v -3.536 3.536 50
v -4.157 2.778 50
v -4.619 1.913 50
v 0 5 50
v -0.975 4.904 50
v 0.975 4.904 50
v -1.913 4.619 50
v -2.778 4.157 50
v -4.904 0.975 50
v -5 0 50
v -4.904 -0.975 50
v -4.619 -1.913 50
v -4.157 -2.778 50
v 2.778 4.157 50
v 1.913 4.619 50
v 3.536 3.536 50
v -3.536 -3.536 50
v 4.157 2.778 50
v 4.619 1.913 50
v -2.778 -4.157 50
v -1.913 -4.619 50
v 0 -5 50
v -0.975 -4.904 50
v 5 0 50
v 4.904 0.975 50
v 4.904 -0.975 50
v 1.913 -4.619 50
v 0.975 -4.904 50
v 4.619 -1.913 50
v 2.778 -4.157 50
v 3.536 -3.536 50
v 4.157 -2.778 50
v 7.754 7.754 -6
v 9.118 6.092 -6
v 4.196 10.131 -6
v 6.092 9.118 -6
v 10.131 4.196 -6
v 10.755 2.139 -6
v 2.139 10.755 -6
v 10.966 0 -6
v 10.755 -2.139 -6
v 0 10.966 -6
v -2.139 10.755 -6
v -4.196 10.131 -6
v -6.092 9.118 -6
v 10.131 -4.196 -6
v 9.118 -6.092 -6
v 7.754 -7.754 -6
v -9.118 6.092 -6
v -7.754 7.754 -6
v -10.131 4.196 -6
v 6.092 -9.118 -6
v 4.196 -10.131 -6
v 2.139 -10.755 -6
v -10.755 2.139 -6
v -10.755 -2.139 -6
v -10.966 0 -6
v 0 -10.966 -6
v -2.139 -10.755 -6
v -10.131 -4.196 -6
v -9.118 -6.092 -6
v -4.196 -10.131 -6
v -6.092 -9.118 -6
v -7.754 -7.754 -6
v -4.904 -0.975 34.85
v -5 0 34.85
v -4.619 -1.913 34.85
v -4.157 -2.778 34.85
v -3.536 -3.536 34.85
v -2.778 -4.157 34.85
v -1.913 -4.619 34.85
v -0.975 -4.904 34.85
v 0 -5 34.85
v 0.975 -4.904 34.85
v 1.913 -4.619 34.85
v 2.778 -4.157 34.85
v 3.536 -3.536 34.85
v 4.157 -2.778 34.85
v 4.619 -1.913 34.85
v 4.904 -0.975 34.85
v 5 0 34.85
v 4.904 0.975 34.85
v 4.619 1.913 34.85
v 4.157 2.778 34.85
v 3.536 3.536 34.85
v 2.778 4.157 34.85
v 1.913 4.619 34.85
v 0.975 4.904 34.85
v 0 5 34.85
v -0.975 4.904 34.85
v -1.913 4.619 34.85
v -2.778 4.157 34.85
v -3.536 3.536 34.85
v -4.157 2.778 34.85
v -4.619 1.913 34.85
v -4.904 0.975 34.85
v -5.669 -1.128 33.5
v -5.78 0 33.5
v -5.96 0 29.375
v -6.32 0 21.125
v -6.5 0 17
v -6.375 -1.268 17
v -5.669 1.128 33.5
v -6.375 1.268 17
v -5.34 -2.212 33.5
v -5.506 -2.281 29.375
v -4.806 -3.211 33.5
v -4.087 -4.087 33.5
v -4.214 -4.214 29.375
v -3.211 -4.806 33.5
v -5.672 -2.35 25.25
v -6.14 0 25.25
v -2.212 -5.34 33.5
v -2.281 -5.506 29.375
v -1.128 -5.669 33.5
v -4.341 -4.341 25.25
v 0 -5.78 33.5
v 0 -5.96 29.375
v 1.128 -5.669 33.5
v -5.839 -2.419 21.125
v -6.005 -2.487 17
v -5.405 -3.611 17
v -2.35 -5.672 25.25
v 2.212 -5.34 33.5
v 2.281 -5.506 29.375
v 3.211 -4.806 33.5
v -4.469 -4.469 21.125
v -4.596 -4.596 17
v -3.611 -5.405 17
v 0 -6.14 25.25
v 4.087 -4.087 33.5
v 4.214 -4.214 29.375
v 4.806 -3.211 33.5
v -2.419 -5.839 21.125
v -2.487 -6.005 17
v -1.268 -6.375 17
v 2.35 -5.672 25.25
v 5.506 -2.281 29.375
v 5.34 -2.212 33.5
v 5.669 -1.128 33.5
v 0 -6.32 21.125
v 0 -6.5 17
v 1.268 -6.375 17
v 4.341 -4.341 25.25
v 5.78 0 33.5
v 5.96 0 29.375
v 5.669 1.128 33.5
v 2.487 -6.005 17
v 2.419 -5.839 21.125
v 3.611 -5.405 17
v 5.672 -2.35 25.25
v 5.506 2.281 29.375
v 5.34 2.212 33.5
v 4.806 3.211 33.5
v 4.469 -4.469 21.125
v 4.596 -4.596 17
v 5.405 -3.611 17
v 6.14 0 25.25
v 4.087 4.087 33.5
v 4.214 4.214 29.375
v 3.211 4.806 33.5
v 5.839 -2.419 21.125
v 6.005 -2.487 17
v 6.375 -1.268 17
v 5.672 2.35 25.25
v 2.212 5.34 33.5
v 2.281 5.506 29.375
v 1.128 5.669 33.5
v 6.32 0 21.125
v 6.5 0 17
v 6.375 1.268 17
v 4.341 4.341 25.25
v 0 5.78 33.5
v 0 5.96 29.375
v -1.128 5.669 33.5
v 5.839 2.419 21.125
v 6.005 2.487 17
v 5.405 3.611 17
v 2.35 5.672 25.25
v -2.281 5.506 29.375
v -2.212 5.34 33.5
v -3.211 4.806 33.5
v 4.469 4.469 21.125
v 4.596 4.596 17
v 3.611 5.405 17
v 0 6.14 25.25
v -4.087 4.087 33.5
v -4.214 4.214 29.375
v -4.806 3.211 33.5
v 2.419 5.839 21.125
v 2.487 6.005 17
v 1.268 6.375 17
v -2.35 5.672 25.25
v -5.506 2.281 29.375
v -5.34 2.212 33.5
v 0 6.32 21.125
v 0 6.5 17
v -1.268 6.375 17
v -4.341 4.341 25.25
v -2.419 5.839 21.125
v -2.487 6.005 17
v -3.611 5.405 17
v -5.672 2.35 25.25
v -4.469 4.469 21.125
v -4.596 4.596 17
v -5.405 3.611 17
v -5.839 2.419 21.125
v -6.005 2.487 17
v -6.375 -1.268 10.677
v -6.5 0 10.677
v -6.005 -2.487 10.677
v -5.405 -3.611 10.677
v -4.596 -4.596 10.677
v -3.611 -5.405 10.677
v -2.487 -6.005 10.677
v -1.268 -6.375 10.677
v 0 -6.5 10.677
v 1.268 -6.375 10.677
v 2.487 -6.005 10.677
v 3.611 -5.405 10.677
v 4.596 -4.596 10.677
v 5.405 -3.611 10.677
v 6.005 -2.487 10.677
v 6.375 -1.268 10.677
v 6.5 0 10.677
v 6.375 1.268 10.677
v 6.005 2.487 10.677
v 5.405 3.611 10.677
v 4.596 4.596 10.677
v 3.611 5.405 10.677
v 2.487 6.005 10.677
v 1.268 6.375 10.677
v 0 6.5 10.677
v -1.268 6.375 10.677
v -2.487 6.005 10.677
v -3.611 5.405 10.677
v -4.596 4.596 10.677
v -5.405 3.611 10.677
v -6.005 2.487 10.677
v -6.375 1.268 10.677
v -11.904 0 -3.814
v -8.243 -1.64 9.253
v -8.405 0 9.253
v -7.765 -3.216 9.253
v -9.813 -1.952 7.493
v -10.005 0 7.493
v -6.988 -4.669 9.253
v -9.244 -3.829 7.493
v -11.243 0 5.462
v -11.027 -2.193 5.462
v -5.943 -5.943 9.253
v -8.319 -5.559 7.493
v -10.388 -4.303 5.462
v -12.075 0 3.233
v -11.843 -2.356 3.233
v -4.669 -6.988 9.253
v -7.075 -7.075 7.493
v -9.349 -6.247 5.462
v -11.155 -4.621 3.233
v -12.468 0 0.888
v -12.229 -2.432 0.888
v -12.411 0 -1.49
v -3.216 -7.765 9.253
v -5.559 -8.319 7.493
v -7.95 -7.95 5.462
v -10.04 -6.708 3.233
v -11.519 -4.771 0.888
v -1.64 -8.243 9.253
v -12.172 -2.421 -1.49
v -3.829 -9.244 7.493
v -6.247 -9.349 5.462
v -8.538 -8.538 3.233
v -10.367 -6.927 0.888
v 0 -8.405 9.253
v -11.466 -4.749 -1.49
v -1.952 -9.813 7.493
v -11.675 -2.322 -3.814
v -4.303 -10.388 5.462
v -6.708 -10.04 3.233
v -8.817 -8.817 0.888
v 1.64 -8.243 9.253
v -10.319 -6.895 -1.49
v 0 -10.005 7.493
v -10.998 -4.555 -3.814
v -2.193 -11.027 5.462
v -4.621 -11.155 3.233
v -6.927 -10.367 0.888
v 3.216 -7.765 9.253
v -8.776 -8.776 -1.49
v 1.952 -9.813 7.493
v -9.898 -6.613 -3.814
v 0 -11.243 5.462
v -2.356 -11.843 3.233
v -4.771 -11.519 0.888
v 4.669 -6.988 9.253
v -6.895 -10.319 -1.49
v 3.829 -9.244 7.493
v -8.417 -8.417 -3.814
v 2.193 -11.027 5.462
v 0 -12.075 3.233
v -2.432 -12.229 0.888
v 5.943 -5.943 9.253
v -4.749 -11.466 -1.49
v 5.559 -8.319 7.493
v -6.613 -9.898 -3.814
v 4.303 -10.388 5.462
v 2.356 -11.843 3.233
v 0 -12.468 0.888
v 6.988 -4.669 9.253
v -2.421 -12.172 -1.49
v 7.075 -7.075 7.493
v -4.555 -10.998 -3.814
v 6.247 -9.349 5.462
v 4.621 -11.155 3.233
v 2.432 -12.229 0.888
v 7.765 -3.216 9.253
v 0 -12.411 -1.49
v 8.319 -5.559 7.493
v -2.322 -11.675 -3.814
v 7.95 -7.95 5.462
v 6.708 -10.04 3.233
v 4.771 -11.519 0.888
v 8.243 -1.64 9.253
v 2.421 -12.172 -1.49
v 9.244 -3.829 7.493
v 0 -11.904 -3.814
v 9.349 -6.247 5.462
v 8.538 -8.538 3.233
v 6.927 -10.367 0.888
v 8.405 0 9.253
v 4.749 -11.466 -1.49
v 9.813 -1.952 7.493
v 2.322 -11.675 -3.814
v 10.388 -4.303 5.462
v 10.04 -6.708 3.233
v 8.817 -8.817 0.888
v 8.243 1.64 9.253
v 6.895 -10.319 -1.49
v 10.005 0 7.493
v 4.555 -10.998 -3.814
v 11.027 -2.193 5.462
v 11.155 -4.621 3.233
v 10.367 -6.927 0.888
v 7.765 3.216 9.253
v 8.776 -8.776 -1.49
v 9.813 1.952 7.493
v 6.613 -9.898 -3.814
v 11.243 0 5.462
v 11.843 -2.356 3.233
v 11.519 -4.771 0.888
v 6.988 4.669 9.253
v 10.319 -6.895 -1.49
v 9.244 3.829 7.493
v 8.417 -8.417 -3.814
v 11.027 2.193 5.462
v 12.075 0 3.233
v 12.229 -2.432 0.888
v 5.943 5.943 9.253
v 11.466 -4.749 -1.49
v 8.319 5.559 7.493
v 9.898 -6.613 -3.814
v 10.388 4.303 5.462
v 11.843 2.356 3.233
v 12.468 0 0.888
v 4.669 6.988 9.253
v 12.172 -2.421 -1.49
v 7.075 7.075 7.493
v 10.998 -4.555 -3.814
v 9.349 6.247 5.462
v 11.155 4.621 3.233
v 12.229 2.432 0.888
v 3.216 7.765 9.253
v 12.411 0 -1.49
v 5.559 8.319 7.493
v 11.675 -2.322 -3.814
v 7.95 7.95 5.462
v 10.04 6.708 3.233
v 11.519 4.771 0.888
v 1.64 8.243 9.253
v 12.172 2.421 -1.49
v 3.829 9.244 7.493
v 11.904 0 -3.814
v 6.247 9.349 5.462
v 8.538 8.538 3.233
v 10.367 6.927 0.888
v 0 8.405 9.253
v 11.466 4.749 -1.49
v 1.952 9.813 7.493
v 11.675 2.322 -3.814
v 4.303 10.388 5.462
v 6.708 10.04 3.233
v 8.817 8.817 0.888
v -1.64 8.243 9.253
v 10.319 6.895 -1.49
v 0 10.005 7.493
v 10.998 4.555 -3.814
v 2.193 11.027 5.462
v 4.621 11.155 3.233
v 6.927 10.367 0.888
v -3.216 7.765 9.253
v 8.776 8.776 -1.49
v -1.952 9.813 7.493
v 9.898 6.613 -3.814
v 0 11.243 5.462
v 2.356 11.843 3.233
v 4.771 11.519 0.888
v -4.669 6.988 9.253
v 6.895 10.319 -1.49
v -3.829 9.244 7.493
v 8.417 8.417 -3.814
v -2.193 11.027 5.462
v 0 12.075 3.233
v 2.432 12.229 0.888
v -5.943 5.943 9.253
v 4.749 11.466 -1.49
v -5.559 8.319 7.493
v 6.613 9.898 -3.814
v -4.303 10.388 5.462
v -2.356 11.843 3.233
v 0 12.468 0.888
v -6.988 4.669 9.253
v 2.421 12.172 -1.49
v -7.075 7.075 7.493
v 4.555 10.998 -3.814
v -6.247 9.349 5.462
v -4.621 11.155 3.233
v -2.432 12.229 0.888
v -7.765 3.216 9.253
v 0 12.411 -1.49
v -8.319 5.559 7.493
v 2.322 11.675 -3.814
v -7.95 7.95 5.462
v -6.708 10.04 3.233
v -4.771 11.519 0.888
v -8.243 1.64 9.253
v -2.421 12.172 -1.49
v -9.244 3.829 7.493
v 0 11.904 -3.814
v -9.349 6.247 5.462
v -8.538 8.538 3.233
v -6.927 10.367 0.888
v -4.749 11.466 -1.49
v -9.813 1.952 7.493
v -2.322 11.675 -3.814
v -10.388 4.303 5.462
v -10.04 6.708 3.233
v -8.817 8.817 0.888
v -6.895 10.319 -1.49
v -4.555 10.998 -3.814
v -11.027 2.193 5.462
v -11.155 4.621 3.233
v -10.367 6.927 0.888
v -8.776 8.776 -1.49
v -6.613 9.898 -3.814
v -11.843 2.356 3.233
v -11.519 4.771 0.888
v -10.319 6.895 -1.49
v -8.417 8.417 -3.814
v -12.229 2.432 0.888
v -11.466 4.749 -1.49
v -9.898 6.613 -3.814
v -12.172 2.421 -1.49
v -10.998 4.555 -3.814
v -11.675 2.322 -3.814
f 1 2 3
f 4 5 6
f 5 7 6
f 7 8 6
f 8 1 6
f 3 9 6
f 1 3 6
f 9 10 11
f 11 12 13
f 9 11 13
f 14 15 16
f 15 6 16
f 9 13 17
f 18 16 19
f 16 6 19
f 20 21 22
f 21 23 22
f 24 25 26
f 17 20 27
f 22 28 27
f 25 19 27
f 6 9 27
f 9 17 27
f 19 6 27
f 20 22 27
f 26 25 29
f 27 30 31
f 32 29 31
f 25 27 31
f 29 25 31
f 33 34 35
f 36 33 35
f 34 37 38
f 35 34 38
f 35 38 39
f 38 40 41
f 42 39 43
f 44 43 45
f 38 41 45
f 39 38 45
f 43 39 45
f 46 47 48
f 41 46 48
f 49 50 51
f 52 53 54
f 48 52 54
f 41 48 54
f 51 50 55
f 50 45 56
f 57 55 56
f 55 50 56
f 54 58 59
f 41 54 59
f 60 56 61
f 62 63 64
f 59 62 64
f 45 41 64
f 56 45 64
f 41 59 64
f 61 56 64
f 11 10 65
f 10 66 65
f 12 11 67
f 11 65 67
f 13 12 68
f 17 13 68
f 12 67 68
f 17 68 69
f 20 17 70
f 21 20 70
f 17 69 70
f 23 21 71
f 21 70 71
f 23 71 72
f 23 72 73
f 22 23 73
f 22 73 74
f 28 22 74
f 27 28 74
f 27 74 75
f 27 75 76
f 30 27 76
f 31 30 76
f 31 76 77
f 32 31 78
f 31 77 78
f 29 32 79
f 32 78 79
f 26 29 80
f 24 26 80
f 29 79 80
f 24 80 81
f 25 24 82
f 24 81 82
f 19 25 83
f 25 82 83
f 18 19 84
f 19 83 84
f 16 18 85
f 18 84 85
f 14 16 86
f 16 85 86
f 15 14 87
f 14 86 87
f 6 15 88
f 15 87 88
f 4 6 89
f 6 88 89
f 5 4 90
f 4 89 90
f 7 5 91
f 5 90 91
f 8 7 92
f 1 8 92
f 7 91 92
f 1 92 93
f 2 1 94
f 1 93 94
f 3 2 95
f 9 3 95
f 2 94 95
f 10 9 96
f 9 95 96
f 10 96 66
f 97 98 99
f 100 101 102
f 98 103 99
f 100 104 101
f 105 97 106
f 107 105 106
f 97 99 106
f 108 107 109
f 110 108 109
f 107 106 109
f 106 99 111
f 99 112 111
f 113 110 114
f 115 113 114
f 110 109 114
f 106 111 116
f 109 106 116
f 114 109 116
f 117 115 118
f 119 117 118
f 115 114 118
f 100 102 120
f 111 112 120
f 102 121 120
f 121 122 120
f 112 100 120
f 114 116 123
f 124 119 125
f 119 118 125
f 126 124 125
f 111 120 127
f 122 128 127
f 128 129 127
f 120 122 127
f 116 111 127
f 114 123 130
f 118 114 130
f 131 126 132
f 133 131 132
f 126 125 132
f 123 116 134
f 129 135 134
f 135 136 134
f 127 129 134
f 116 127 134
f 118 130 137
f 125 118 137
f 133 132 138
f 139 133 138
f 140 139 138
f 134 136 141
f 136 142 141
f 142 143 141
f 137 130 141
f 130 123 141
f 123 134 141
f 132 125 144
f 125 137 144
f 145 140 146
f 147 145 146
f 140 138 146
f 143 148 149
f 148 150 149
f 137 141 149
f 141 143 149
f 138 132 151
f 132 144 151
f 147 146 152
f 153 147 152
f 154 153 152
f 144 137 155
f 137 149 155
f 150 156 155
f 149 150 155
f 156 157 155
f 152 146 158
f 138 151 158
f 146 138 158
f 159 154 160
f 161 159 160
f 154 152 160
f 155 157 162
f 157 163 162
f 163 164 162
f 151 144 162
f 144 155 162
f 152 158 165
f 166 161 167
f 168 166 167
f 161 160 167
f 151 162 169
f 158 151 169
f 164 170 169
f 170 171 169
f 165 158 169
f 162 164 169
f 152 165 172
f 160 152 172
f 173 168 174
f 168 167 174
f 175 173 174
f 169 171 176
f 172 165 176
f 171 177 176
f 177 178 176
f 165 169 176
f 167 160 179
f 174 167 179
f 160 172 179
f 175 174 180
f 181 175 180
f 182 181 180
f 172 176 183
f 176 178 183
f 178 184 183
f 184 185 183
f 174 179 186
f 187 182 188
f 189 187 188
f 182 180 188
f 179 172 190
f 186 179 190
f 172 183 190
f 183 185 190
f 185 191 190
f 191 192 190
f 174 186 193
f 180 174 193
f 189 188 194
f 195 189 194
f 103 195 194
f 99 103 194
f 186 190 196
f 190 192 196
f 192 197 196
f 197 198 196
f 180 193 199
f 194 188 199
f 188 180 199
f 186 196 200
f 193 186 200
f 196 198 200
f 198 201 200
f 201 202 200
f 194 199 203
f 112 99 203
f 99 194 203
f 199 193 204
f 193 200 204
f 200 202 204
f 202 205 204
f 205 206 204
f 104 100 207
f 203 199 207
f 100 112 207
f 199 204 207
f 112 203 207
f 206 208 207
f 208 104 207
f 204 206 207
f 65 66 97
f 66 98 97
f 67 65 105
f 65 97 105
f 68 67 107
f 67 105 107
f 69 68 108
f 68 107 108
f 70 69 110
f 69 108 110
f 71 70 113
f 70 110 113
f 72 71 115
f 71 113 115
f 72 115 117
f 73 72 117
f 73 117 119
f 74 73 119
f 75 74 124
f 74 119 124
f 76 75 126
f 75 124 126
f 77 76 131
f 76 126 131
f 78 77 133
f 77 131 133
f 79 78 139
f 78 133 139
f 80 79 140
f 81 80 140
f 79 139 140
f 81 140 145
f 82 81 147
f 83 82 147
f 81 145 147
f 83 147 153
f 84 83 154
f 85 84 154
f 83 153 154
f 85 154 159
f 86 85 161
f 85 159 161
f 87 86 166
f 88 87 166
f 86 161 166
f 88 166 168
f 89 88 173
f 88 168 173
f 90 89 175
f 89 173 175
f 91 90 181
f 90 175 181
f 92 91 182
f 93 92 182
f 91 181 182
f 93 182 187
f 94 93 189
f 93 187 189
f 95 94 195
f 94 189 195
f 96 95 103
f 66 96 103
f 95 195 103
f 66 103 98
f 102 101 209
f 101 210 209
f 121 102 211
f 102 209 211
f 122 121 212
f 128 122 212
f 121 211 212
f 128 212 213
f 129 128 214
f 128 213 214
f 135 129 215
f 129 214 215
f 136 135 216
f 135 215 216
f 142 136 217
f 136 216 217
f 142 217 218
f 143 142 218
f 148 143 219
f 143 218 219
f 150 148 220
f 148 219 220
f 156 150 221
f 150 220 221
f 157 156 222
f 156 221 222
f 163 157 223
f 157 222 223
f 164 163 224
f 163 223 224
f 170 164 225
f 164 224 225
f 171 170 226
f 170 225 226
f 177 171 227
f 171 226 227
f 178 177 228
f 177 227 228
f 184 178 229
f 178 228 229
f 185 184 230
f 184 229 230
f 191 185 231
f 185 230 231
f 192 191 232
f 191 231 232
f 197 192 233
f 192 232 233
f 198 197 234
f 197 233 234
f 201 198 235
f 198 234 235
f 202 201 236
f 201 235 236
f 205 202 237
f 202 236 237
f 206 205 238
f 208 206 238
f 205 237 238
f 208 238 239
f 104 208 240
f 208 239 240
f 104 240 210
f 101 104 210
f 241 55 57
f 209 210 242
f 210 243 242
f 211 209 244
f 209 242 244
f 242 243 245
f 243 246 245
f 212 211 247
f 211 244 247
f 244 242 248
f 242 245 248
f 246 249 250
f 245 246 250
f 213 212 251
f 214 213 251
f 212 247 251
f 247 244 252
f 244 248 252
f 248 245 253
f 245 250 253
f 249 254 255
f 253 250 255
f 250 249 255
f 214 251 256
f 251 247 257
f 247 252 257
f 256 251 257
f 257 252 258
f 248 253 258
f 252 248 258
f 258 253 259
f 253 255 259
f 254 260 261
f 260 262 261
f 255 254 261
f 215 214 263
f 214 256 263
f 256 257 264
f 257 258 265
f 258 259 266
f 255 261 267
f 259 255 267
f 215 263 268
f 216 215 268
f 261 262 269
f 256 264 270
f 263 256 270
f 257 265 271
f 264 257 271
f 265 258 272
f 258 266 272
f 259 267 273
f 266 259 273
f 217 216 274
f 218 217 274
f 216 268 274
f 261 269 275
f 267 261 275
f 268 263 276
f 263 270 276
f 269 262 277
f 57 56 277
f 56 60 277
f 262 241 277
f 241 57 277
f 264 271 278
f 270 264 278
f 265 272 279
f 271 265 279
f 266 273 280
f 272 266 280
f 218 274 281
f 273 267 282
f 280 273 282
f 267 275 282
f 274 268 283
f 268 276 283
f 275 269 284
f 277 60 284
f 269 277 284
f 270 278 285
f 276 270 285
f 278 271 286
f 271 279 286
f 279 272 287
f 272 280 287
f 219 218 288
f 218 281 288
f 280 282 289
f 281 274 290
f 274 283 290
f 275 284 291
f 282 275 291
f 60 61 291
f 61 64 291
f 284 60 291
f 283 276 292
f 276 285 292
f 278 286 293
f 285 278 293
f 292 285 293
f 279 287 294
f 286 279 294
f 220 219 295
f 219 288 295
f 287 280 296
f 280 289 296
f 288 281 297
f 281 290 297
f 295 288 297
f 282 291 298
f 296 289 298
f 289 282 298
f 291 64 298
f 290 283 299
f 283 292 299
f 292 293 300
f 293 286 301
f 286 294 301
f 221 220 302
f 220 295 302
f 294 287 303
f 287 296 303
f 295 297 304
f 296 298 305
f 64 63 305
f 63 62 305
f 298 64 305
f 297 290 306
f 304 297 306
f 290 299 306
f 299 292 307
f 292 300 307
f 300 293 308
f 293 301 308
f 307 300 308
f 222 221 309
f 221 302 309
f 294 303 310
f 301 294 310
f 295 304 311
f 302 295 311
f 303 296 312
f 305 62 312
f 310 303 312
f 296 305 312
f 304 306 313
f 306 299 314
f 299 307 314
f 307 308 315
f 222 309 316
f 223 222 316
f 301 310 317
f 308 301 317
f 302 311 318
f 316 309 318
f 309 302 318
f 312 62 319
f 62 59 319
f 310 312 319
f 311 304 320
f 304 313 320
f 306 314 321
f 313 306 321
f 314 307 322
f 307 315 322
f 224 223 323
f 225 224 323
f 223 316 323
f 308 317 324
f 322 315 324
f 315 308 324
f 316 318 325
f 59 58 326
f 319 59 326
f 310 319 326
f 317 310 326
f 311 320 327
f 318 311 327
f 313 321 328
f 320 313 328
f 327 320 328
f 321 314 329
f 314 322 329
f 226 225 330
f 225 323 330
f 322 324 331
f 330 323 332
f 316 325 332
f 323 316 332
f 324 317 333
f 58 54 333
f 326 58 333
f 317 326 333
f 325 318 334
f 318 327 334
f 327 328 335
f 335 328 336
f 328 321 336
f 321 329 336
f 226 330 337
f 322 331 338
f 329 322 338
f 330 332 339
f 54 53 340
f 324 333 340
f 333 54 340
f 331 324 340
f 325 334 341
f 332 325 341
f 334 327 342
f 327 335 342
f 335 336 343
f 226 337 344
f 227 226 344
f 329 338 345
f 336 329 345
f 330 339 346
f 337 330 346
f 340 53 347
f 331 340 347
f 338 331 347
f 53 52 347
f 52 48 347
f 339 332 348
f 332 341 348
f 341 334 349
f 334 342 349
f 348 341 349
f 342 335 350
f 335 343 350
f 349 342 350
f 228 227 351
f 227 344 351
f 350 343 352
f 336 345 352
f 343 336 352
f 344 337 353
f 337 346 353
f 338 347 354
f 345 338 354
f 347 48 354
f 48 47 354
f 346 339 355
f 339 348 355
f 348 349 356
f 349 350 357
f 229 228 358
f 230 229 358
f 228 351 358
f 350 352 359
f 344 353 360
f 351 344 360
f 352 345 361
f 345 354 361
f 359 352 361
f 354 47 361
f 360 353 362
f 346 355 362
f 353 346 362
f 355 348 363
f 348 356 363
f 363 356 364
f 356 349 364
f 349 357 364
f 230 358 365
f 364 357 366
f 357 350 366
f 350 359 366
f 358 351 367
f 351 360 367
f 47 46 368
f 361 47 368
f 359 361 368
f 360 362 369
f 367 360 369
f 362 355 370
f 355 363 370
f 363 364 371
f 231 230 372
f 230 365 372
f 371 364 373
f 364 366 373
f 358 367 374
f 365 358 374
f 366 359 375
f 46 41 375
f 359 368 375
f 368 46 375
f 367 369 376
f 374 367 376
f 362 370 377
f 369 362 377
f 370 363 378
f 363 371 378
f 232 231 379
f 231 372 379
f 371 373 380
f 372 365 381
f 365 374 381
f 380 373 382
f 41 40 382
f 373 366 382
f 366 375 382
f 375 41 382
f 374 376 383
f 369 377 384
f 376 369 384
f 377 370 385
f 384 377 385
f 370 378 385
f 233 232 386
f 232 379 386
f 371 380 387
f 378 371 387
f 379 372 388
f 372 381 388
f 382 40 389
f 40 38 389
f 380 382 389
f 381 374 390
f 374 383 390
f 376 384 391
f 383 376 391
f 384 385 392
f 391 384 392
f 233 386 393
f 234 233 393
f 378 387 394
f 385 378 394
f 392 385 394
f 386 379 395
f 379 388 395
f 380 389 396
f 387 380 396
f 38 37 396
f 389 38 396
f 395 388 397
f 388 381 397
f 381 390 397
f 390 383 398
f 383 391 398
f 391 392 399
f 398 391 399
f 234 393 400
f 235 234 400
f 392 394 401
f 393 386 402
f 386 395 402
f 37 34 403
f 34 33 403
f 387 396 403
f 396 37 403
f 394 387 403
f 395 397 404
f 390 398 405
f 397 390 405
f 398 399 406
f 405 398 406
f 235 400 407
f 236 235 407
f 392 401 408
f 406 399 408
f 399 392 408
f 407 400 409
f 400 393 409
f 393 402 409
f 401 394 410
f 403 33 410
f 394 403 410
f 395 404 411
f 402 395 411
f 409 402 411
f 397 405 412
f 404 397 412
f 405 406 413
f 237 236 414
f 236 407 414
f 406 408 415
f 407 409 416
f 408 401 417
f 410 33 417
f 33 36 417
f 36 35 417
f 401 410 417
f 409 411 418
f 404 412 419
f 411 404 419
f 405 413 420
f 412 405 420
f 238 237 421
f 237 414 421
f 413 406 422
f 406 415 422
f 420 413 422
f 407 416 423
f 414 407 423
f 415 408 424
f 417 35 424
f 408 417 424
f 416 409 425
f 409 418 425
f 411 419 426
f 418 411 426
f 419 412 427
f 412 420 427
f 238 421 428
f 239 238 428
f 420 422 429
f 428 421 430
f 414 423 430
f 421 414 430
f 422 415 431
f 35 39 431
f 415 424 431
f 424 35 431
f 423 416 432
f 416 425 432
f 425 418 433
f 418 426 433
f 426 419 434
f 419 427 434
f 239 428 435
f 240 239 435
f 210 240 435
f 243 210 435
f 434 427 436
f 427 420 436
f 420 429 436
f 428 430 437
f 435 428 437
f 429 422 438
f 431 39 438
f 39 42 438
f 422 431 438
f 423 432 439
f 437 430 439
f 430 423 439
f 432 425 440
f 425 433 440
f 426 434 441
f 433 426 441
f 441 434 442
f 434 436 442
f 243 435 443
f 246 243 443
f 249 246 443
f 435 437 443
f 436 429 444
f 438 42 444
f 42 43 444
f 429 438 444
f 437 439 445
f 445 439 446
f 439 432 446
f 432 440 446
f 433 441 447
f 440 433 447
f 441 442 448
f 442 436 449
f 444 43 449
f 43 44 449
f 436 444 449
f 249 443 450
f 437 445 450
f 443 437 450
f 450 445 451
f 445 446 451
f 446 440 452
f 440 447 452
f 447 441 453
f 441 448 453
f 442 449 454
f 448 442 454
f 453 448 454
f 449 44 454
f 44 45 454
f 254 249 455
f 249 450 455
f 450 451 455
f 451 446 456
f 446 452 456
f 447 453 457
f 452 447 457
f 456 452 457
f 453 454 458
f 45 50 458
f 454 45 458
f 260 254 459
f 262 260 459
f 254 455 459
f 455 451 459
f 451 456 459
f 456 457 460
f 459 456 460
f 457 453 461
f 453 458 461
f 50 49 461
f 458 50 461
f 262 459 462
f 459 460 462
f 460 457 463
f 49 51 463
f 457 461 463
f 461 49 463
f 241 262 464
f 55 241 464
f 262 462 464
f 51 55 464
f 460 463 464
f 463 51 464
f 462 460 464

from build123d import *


with BuildPart() as f1:
    # F0 (on Front) → F1 (revolve)
    with BuildSketch(Plane.XZ):
        with BuildLine():
            Line((-6.5, 17), (-6.5, 10.677078))
            ThreePointArc((-6.5, 10.677078), (-12.074571, 3.233378), (-10.965856, -6))
            Line((-10.965856, -6), (0, -6))
            Line((0, -6), (0, 50))
            Line((0, 50), (-5, 50))
            Line((-5, 50), (-5, 34.850297))
            Line((-5, 34.850297), (-5.779594, 33.5))
            Line((-5.779594, 33.5), (-6.5, 17))
        make_face()
    revolve(axis=Axis((0, 0, 20.436795), (0, 0, 1)))


solid = f1.part
